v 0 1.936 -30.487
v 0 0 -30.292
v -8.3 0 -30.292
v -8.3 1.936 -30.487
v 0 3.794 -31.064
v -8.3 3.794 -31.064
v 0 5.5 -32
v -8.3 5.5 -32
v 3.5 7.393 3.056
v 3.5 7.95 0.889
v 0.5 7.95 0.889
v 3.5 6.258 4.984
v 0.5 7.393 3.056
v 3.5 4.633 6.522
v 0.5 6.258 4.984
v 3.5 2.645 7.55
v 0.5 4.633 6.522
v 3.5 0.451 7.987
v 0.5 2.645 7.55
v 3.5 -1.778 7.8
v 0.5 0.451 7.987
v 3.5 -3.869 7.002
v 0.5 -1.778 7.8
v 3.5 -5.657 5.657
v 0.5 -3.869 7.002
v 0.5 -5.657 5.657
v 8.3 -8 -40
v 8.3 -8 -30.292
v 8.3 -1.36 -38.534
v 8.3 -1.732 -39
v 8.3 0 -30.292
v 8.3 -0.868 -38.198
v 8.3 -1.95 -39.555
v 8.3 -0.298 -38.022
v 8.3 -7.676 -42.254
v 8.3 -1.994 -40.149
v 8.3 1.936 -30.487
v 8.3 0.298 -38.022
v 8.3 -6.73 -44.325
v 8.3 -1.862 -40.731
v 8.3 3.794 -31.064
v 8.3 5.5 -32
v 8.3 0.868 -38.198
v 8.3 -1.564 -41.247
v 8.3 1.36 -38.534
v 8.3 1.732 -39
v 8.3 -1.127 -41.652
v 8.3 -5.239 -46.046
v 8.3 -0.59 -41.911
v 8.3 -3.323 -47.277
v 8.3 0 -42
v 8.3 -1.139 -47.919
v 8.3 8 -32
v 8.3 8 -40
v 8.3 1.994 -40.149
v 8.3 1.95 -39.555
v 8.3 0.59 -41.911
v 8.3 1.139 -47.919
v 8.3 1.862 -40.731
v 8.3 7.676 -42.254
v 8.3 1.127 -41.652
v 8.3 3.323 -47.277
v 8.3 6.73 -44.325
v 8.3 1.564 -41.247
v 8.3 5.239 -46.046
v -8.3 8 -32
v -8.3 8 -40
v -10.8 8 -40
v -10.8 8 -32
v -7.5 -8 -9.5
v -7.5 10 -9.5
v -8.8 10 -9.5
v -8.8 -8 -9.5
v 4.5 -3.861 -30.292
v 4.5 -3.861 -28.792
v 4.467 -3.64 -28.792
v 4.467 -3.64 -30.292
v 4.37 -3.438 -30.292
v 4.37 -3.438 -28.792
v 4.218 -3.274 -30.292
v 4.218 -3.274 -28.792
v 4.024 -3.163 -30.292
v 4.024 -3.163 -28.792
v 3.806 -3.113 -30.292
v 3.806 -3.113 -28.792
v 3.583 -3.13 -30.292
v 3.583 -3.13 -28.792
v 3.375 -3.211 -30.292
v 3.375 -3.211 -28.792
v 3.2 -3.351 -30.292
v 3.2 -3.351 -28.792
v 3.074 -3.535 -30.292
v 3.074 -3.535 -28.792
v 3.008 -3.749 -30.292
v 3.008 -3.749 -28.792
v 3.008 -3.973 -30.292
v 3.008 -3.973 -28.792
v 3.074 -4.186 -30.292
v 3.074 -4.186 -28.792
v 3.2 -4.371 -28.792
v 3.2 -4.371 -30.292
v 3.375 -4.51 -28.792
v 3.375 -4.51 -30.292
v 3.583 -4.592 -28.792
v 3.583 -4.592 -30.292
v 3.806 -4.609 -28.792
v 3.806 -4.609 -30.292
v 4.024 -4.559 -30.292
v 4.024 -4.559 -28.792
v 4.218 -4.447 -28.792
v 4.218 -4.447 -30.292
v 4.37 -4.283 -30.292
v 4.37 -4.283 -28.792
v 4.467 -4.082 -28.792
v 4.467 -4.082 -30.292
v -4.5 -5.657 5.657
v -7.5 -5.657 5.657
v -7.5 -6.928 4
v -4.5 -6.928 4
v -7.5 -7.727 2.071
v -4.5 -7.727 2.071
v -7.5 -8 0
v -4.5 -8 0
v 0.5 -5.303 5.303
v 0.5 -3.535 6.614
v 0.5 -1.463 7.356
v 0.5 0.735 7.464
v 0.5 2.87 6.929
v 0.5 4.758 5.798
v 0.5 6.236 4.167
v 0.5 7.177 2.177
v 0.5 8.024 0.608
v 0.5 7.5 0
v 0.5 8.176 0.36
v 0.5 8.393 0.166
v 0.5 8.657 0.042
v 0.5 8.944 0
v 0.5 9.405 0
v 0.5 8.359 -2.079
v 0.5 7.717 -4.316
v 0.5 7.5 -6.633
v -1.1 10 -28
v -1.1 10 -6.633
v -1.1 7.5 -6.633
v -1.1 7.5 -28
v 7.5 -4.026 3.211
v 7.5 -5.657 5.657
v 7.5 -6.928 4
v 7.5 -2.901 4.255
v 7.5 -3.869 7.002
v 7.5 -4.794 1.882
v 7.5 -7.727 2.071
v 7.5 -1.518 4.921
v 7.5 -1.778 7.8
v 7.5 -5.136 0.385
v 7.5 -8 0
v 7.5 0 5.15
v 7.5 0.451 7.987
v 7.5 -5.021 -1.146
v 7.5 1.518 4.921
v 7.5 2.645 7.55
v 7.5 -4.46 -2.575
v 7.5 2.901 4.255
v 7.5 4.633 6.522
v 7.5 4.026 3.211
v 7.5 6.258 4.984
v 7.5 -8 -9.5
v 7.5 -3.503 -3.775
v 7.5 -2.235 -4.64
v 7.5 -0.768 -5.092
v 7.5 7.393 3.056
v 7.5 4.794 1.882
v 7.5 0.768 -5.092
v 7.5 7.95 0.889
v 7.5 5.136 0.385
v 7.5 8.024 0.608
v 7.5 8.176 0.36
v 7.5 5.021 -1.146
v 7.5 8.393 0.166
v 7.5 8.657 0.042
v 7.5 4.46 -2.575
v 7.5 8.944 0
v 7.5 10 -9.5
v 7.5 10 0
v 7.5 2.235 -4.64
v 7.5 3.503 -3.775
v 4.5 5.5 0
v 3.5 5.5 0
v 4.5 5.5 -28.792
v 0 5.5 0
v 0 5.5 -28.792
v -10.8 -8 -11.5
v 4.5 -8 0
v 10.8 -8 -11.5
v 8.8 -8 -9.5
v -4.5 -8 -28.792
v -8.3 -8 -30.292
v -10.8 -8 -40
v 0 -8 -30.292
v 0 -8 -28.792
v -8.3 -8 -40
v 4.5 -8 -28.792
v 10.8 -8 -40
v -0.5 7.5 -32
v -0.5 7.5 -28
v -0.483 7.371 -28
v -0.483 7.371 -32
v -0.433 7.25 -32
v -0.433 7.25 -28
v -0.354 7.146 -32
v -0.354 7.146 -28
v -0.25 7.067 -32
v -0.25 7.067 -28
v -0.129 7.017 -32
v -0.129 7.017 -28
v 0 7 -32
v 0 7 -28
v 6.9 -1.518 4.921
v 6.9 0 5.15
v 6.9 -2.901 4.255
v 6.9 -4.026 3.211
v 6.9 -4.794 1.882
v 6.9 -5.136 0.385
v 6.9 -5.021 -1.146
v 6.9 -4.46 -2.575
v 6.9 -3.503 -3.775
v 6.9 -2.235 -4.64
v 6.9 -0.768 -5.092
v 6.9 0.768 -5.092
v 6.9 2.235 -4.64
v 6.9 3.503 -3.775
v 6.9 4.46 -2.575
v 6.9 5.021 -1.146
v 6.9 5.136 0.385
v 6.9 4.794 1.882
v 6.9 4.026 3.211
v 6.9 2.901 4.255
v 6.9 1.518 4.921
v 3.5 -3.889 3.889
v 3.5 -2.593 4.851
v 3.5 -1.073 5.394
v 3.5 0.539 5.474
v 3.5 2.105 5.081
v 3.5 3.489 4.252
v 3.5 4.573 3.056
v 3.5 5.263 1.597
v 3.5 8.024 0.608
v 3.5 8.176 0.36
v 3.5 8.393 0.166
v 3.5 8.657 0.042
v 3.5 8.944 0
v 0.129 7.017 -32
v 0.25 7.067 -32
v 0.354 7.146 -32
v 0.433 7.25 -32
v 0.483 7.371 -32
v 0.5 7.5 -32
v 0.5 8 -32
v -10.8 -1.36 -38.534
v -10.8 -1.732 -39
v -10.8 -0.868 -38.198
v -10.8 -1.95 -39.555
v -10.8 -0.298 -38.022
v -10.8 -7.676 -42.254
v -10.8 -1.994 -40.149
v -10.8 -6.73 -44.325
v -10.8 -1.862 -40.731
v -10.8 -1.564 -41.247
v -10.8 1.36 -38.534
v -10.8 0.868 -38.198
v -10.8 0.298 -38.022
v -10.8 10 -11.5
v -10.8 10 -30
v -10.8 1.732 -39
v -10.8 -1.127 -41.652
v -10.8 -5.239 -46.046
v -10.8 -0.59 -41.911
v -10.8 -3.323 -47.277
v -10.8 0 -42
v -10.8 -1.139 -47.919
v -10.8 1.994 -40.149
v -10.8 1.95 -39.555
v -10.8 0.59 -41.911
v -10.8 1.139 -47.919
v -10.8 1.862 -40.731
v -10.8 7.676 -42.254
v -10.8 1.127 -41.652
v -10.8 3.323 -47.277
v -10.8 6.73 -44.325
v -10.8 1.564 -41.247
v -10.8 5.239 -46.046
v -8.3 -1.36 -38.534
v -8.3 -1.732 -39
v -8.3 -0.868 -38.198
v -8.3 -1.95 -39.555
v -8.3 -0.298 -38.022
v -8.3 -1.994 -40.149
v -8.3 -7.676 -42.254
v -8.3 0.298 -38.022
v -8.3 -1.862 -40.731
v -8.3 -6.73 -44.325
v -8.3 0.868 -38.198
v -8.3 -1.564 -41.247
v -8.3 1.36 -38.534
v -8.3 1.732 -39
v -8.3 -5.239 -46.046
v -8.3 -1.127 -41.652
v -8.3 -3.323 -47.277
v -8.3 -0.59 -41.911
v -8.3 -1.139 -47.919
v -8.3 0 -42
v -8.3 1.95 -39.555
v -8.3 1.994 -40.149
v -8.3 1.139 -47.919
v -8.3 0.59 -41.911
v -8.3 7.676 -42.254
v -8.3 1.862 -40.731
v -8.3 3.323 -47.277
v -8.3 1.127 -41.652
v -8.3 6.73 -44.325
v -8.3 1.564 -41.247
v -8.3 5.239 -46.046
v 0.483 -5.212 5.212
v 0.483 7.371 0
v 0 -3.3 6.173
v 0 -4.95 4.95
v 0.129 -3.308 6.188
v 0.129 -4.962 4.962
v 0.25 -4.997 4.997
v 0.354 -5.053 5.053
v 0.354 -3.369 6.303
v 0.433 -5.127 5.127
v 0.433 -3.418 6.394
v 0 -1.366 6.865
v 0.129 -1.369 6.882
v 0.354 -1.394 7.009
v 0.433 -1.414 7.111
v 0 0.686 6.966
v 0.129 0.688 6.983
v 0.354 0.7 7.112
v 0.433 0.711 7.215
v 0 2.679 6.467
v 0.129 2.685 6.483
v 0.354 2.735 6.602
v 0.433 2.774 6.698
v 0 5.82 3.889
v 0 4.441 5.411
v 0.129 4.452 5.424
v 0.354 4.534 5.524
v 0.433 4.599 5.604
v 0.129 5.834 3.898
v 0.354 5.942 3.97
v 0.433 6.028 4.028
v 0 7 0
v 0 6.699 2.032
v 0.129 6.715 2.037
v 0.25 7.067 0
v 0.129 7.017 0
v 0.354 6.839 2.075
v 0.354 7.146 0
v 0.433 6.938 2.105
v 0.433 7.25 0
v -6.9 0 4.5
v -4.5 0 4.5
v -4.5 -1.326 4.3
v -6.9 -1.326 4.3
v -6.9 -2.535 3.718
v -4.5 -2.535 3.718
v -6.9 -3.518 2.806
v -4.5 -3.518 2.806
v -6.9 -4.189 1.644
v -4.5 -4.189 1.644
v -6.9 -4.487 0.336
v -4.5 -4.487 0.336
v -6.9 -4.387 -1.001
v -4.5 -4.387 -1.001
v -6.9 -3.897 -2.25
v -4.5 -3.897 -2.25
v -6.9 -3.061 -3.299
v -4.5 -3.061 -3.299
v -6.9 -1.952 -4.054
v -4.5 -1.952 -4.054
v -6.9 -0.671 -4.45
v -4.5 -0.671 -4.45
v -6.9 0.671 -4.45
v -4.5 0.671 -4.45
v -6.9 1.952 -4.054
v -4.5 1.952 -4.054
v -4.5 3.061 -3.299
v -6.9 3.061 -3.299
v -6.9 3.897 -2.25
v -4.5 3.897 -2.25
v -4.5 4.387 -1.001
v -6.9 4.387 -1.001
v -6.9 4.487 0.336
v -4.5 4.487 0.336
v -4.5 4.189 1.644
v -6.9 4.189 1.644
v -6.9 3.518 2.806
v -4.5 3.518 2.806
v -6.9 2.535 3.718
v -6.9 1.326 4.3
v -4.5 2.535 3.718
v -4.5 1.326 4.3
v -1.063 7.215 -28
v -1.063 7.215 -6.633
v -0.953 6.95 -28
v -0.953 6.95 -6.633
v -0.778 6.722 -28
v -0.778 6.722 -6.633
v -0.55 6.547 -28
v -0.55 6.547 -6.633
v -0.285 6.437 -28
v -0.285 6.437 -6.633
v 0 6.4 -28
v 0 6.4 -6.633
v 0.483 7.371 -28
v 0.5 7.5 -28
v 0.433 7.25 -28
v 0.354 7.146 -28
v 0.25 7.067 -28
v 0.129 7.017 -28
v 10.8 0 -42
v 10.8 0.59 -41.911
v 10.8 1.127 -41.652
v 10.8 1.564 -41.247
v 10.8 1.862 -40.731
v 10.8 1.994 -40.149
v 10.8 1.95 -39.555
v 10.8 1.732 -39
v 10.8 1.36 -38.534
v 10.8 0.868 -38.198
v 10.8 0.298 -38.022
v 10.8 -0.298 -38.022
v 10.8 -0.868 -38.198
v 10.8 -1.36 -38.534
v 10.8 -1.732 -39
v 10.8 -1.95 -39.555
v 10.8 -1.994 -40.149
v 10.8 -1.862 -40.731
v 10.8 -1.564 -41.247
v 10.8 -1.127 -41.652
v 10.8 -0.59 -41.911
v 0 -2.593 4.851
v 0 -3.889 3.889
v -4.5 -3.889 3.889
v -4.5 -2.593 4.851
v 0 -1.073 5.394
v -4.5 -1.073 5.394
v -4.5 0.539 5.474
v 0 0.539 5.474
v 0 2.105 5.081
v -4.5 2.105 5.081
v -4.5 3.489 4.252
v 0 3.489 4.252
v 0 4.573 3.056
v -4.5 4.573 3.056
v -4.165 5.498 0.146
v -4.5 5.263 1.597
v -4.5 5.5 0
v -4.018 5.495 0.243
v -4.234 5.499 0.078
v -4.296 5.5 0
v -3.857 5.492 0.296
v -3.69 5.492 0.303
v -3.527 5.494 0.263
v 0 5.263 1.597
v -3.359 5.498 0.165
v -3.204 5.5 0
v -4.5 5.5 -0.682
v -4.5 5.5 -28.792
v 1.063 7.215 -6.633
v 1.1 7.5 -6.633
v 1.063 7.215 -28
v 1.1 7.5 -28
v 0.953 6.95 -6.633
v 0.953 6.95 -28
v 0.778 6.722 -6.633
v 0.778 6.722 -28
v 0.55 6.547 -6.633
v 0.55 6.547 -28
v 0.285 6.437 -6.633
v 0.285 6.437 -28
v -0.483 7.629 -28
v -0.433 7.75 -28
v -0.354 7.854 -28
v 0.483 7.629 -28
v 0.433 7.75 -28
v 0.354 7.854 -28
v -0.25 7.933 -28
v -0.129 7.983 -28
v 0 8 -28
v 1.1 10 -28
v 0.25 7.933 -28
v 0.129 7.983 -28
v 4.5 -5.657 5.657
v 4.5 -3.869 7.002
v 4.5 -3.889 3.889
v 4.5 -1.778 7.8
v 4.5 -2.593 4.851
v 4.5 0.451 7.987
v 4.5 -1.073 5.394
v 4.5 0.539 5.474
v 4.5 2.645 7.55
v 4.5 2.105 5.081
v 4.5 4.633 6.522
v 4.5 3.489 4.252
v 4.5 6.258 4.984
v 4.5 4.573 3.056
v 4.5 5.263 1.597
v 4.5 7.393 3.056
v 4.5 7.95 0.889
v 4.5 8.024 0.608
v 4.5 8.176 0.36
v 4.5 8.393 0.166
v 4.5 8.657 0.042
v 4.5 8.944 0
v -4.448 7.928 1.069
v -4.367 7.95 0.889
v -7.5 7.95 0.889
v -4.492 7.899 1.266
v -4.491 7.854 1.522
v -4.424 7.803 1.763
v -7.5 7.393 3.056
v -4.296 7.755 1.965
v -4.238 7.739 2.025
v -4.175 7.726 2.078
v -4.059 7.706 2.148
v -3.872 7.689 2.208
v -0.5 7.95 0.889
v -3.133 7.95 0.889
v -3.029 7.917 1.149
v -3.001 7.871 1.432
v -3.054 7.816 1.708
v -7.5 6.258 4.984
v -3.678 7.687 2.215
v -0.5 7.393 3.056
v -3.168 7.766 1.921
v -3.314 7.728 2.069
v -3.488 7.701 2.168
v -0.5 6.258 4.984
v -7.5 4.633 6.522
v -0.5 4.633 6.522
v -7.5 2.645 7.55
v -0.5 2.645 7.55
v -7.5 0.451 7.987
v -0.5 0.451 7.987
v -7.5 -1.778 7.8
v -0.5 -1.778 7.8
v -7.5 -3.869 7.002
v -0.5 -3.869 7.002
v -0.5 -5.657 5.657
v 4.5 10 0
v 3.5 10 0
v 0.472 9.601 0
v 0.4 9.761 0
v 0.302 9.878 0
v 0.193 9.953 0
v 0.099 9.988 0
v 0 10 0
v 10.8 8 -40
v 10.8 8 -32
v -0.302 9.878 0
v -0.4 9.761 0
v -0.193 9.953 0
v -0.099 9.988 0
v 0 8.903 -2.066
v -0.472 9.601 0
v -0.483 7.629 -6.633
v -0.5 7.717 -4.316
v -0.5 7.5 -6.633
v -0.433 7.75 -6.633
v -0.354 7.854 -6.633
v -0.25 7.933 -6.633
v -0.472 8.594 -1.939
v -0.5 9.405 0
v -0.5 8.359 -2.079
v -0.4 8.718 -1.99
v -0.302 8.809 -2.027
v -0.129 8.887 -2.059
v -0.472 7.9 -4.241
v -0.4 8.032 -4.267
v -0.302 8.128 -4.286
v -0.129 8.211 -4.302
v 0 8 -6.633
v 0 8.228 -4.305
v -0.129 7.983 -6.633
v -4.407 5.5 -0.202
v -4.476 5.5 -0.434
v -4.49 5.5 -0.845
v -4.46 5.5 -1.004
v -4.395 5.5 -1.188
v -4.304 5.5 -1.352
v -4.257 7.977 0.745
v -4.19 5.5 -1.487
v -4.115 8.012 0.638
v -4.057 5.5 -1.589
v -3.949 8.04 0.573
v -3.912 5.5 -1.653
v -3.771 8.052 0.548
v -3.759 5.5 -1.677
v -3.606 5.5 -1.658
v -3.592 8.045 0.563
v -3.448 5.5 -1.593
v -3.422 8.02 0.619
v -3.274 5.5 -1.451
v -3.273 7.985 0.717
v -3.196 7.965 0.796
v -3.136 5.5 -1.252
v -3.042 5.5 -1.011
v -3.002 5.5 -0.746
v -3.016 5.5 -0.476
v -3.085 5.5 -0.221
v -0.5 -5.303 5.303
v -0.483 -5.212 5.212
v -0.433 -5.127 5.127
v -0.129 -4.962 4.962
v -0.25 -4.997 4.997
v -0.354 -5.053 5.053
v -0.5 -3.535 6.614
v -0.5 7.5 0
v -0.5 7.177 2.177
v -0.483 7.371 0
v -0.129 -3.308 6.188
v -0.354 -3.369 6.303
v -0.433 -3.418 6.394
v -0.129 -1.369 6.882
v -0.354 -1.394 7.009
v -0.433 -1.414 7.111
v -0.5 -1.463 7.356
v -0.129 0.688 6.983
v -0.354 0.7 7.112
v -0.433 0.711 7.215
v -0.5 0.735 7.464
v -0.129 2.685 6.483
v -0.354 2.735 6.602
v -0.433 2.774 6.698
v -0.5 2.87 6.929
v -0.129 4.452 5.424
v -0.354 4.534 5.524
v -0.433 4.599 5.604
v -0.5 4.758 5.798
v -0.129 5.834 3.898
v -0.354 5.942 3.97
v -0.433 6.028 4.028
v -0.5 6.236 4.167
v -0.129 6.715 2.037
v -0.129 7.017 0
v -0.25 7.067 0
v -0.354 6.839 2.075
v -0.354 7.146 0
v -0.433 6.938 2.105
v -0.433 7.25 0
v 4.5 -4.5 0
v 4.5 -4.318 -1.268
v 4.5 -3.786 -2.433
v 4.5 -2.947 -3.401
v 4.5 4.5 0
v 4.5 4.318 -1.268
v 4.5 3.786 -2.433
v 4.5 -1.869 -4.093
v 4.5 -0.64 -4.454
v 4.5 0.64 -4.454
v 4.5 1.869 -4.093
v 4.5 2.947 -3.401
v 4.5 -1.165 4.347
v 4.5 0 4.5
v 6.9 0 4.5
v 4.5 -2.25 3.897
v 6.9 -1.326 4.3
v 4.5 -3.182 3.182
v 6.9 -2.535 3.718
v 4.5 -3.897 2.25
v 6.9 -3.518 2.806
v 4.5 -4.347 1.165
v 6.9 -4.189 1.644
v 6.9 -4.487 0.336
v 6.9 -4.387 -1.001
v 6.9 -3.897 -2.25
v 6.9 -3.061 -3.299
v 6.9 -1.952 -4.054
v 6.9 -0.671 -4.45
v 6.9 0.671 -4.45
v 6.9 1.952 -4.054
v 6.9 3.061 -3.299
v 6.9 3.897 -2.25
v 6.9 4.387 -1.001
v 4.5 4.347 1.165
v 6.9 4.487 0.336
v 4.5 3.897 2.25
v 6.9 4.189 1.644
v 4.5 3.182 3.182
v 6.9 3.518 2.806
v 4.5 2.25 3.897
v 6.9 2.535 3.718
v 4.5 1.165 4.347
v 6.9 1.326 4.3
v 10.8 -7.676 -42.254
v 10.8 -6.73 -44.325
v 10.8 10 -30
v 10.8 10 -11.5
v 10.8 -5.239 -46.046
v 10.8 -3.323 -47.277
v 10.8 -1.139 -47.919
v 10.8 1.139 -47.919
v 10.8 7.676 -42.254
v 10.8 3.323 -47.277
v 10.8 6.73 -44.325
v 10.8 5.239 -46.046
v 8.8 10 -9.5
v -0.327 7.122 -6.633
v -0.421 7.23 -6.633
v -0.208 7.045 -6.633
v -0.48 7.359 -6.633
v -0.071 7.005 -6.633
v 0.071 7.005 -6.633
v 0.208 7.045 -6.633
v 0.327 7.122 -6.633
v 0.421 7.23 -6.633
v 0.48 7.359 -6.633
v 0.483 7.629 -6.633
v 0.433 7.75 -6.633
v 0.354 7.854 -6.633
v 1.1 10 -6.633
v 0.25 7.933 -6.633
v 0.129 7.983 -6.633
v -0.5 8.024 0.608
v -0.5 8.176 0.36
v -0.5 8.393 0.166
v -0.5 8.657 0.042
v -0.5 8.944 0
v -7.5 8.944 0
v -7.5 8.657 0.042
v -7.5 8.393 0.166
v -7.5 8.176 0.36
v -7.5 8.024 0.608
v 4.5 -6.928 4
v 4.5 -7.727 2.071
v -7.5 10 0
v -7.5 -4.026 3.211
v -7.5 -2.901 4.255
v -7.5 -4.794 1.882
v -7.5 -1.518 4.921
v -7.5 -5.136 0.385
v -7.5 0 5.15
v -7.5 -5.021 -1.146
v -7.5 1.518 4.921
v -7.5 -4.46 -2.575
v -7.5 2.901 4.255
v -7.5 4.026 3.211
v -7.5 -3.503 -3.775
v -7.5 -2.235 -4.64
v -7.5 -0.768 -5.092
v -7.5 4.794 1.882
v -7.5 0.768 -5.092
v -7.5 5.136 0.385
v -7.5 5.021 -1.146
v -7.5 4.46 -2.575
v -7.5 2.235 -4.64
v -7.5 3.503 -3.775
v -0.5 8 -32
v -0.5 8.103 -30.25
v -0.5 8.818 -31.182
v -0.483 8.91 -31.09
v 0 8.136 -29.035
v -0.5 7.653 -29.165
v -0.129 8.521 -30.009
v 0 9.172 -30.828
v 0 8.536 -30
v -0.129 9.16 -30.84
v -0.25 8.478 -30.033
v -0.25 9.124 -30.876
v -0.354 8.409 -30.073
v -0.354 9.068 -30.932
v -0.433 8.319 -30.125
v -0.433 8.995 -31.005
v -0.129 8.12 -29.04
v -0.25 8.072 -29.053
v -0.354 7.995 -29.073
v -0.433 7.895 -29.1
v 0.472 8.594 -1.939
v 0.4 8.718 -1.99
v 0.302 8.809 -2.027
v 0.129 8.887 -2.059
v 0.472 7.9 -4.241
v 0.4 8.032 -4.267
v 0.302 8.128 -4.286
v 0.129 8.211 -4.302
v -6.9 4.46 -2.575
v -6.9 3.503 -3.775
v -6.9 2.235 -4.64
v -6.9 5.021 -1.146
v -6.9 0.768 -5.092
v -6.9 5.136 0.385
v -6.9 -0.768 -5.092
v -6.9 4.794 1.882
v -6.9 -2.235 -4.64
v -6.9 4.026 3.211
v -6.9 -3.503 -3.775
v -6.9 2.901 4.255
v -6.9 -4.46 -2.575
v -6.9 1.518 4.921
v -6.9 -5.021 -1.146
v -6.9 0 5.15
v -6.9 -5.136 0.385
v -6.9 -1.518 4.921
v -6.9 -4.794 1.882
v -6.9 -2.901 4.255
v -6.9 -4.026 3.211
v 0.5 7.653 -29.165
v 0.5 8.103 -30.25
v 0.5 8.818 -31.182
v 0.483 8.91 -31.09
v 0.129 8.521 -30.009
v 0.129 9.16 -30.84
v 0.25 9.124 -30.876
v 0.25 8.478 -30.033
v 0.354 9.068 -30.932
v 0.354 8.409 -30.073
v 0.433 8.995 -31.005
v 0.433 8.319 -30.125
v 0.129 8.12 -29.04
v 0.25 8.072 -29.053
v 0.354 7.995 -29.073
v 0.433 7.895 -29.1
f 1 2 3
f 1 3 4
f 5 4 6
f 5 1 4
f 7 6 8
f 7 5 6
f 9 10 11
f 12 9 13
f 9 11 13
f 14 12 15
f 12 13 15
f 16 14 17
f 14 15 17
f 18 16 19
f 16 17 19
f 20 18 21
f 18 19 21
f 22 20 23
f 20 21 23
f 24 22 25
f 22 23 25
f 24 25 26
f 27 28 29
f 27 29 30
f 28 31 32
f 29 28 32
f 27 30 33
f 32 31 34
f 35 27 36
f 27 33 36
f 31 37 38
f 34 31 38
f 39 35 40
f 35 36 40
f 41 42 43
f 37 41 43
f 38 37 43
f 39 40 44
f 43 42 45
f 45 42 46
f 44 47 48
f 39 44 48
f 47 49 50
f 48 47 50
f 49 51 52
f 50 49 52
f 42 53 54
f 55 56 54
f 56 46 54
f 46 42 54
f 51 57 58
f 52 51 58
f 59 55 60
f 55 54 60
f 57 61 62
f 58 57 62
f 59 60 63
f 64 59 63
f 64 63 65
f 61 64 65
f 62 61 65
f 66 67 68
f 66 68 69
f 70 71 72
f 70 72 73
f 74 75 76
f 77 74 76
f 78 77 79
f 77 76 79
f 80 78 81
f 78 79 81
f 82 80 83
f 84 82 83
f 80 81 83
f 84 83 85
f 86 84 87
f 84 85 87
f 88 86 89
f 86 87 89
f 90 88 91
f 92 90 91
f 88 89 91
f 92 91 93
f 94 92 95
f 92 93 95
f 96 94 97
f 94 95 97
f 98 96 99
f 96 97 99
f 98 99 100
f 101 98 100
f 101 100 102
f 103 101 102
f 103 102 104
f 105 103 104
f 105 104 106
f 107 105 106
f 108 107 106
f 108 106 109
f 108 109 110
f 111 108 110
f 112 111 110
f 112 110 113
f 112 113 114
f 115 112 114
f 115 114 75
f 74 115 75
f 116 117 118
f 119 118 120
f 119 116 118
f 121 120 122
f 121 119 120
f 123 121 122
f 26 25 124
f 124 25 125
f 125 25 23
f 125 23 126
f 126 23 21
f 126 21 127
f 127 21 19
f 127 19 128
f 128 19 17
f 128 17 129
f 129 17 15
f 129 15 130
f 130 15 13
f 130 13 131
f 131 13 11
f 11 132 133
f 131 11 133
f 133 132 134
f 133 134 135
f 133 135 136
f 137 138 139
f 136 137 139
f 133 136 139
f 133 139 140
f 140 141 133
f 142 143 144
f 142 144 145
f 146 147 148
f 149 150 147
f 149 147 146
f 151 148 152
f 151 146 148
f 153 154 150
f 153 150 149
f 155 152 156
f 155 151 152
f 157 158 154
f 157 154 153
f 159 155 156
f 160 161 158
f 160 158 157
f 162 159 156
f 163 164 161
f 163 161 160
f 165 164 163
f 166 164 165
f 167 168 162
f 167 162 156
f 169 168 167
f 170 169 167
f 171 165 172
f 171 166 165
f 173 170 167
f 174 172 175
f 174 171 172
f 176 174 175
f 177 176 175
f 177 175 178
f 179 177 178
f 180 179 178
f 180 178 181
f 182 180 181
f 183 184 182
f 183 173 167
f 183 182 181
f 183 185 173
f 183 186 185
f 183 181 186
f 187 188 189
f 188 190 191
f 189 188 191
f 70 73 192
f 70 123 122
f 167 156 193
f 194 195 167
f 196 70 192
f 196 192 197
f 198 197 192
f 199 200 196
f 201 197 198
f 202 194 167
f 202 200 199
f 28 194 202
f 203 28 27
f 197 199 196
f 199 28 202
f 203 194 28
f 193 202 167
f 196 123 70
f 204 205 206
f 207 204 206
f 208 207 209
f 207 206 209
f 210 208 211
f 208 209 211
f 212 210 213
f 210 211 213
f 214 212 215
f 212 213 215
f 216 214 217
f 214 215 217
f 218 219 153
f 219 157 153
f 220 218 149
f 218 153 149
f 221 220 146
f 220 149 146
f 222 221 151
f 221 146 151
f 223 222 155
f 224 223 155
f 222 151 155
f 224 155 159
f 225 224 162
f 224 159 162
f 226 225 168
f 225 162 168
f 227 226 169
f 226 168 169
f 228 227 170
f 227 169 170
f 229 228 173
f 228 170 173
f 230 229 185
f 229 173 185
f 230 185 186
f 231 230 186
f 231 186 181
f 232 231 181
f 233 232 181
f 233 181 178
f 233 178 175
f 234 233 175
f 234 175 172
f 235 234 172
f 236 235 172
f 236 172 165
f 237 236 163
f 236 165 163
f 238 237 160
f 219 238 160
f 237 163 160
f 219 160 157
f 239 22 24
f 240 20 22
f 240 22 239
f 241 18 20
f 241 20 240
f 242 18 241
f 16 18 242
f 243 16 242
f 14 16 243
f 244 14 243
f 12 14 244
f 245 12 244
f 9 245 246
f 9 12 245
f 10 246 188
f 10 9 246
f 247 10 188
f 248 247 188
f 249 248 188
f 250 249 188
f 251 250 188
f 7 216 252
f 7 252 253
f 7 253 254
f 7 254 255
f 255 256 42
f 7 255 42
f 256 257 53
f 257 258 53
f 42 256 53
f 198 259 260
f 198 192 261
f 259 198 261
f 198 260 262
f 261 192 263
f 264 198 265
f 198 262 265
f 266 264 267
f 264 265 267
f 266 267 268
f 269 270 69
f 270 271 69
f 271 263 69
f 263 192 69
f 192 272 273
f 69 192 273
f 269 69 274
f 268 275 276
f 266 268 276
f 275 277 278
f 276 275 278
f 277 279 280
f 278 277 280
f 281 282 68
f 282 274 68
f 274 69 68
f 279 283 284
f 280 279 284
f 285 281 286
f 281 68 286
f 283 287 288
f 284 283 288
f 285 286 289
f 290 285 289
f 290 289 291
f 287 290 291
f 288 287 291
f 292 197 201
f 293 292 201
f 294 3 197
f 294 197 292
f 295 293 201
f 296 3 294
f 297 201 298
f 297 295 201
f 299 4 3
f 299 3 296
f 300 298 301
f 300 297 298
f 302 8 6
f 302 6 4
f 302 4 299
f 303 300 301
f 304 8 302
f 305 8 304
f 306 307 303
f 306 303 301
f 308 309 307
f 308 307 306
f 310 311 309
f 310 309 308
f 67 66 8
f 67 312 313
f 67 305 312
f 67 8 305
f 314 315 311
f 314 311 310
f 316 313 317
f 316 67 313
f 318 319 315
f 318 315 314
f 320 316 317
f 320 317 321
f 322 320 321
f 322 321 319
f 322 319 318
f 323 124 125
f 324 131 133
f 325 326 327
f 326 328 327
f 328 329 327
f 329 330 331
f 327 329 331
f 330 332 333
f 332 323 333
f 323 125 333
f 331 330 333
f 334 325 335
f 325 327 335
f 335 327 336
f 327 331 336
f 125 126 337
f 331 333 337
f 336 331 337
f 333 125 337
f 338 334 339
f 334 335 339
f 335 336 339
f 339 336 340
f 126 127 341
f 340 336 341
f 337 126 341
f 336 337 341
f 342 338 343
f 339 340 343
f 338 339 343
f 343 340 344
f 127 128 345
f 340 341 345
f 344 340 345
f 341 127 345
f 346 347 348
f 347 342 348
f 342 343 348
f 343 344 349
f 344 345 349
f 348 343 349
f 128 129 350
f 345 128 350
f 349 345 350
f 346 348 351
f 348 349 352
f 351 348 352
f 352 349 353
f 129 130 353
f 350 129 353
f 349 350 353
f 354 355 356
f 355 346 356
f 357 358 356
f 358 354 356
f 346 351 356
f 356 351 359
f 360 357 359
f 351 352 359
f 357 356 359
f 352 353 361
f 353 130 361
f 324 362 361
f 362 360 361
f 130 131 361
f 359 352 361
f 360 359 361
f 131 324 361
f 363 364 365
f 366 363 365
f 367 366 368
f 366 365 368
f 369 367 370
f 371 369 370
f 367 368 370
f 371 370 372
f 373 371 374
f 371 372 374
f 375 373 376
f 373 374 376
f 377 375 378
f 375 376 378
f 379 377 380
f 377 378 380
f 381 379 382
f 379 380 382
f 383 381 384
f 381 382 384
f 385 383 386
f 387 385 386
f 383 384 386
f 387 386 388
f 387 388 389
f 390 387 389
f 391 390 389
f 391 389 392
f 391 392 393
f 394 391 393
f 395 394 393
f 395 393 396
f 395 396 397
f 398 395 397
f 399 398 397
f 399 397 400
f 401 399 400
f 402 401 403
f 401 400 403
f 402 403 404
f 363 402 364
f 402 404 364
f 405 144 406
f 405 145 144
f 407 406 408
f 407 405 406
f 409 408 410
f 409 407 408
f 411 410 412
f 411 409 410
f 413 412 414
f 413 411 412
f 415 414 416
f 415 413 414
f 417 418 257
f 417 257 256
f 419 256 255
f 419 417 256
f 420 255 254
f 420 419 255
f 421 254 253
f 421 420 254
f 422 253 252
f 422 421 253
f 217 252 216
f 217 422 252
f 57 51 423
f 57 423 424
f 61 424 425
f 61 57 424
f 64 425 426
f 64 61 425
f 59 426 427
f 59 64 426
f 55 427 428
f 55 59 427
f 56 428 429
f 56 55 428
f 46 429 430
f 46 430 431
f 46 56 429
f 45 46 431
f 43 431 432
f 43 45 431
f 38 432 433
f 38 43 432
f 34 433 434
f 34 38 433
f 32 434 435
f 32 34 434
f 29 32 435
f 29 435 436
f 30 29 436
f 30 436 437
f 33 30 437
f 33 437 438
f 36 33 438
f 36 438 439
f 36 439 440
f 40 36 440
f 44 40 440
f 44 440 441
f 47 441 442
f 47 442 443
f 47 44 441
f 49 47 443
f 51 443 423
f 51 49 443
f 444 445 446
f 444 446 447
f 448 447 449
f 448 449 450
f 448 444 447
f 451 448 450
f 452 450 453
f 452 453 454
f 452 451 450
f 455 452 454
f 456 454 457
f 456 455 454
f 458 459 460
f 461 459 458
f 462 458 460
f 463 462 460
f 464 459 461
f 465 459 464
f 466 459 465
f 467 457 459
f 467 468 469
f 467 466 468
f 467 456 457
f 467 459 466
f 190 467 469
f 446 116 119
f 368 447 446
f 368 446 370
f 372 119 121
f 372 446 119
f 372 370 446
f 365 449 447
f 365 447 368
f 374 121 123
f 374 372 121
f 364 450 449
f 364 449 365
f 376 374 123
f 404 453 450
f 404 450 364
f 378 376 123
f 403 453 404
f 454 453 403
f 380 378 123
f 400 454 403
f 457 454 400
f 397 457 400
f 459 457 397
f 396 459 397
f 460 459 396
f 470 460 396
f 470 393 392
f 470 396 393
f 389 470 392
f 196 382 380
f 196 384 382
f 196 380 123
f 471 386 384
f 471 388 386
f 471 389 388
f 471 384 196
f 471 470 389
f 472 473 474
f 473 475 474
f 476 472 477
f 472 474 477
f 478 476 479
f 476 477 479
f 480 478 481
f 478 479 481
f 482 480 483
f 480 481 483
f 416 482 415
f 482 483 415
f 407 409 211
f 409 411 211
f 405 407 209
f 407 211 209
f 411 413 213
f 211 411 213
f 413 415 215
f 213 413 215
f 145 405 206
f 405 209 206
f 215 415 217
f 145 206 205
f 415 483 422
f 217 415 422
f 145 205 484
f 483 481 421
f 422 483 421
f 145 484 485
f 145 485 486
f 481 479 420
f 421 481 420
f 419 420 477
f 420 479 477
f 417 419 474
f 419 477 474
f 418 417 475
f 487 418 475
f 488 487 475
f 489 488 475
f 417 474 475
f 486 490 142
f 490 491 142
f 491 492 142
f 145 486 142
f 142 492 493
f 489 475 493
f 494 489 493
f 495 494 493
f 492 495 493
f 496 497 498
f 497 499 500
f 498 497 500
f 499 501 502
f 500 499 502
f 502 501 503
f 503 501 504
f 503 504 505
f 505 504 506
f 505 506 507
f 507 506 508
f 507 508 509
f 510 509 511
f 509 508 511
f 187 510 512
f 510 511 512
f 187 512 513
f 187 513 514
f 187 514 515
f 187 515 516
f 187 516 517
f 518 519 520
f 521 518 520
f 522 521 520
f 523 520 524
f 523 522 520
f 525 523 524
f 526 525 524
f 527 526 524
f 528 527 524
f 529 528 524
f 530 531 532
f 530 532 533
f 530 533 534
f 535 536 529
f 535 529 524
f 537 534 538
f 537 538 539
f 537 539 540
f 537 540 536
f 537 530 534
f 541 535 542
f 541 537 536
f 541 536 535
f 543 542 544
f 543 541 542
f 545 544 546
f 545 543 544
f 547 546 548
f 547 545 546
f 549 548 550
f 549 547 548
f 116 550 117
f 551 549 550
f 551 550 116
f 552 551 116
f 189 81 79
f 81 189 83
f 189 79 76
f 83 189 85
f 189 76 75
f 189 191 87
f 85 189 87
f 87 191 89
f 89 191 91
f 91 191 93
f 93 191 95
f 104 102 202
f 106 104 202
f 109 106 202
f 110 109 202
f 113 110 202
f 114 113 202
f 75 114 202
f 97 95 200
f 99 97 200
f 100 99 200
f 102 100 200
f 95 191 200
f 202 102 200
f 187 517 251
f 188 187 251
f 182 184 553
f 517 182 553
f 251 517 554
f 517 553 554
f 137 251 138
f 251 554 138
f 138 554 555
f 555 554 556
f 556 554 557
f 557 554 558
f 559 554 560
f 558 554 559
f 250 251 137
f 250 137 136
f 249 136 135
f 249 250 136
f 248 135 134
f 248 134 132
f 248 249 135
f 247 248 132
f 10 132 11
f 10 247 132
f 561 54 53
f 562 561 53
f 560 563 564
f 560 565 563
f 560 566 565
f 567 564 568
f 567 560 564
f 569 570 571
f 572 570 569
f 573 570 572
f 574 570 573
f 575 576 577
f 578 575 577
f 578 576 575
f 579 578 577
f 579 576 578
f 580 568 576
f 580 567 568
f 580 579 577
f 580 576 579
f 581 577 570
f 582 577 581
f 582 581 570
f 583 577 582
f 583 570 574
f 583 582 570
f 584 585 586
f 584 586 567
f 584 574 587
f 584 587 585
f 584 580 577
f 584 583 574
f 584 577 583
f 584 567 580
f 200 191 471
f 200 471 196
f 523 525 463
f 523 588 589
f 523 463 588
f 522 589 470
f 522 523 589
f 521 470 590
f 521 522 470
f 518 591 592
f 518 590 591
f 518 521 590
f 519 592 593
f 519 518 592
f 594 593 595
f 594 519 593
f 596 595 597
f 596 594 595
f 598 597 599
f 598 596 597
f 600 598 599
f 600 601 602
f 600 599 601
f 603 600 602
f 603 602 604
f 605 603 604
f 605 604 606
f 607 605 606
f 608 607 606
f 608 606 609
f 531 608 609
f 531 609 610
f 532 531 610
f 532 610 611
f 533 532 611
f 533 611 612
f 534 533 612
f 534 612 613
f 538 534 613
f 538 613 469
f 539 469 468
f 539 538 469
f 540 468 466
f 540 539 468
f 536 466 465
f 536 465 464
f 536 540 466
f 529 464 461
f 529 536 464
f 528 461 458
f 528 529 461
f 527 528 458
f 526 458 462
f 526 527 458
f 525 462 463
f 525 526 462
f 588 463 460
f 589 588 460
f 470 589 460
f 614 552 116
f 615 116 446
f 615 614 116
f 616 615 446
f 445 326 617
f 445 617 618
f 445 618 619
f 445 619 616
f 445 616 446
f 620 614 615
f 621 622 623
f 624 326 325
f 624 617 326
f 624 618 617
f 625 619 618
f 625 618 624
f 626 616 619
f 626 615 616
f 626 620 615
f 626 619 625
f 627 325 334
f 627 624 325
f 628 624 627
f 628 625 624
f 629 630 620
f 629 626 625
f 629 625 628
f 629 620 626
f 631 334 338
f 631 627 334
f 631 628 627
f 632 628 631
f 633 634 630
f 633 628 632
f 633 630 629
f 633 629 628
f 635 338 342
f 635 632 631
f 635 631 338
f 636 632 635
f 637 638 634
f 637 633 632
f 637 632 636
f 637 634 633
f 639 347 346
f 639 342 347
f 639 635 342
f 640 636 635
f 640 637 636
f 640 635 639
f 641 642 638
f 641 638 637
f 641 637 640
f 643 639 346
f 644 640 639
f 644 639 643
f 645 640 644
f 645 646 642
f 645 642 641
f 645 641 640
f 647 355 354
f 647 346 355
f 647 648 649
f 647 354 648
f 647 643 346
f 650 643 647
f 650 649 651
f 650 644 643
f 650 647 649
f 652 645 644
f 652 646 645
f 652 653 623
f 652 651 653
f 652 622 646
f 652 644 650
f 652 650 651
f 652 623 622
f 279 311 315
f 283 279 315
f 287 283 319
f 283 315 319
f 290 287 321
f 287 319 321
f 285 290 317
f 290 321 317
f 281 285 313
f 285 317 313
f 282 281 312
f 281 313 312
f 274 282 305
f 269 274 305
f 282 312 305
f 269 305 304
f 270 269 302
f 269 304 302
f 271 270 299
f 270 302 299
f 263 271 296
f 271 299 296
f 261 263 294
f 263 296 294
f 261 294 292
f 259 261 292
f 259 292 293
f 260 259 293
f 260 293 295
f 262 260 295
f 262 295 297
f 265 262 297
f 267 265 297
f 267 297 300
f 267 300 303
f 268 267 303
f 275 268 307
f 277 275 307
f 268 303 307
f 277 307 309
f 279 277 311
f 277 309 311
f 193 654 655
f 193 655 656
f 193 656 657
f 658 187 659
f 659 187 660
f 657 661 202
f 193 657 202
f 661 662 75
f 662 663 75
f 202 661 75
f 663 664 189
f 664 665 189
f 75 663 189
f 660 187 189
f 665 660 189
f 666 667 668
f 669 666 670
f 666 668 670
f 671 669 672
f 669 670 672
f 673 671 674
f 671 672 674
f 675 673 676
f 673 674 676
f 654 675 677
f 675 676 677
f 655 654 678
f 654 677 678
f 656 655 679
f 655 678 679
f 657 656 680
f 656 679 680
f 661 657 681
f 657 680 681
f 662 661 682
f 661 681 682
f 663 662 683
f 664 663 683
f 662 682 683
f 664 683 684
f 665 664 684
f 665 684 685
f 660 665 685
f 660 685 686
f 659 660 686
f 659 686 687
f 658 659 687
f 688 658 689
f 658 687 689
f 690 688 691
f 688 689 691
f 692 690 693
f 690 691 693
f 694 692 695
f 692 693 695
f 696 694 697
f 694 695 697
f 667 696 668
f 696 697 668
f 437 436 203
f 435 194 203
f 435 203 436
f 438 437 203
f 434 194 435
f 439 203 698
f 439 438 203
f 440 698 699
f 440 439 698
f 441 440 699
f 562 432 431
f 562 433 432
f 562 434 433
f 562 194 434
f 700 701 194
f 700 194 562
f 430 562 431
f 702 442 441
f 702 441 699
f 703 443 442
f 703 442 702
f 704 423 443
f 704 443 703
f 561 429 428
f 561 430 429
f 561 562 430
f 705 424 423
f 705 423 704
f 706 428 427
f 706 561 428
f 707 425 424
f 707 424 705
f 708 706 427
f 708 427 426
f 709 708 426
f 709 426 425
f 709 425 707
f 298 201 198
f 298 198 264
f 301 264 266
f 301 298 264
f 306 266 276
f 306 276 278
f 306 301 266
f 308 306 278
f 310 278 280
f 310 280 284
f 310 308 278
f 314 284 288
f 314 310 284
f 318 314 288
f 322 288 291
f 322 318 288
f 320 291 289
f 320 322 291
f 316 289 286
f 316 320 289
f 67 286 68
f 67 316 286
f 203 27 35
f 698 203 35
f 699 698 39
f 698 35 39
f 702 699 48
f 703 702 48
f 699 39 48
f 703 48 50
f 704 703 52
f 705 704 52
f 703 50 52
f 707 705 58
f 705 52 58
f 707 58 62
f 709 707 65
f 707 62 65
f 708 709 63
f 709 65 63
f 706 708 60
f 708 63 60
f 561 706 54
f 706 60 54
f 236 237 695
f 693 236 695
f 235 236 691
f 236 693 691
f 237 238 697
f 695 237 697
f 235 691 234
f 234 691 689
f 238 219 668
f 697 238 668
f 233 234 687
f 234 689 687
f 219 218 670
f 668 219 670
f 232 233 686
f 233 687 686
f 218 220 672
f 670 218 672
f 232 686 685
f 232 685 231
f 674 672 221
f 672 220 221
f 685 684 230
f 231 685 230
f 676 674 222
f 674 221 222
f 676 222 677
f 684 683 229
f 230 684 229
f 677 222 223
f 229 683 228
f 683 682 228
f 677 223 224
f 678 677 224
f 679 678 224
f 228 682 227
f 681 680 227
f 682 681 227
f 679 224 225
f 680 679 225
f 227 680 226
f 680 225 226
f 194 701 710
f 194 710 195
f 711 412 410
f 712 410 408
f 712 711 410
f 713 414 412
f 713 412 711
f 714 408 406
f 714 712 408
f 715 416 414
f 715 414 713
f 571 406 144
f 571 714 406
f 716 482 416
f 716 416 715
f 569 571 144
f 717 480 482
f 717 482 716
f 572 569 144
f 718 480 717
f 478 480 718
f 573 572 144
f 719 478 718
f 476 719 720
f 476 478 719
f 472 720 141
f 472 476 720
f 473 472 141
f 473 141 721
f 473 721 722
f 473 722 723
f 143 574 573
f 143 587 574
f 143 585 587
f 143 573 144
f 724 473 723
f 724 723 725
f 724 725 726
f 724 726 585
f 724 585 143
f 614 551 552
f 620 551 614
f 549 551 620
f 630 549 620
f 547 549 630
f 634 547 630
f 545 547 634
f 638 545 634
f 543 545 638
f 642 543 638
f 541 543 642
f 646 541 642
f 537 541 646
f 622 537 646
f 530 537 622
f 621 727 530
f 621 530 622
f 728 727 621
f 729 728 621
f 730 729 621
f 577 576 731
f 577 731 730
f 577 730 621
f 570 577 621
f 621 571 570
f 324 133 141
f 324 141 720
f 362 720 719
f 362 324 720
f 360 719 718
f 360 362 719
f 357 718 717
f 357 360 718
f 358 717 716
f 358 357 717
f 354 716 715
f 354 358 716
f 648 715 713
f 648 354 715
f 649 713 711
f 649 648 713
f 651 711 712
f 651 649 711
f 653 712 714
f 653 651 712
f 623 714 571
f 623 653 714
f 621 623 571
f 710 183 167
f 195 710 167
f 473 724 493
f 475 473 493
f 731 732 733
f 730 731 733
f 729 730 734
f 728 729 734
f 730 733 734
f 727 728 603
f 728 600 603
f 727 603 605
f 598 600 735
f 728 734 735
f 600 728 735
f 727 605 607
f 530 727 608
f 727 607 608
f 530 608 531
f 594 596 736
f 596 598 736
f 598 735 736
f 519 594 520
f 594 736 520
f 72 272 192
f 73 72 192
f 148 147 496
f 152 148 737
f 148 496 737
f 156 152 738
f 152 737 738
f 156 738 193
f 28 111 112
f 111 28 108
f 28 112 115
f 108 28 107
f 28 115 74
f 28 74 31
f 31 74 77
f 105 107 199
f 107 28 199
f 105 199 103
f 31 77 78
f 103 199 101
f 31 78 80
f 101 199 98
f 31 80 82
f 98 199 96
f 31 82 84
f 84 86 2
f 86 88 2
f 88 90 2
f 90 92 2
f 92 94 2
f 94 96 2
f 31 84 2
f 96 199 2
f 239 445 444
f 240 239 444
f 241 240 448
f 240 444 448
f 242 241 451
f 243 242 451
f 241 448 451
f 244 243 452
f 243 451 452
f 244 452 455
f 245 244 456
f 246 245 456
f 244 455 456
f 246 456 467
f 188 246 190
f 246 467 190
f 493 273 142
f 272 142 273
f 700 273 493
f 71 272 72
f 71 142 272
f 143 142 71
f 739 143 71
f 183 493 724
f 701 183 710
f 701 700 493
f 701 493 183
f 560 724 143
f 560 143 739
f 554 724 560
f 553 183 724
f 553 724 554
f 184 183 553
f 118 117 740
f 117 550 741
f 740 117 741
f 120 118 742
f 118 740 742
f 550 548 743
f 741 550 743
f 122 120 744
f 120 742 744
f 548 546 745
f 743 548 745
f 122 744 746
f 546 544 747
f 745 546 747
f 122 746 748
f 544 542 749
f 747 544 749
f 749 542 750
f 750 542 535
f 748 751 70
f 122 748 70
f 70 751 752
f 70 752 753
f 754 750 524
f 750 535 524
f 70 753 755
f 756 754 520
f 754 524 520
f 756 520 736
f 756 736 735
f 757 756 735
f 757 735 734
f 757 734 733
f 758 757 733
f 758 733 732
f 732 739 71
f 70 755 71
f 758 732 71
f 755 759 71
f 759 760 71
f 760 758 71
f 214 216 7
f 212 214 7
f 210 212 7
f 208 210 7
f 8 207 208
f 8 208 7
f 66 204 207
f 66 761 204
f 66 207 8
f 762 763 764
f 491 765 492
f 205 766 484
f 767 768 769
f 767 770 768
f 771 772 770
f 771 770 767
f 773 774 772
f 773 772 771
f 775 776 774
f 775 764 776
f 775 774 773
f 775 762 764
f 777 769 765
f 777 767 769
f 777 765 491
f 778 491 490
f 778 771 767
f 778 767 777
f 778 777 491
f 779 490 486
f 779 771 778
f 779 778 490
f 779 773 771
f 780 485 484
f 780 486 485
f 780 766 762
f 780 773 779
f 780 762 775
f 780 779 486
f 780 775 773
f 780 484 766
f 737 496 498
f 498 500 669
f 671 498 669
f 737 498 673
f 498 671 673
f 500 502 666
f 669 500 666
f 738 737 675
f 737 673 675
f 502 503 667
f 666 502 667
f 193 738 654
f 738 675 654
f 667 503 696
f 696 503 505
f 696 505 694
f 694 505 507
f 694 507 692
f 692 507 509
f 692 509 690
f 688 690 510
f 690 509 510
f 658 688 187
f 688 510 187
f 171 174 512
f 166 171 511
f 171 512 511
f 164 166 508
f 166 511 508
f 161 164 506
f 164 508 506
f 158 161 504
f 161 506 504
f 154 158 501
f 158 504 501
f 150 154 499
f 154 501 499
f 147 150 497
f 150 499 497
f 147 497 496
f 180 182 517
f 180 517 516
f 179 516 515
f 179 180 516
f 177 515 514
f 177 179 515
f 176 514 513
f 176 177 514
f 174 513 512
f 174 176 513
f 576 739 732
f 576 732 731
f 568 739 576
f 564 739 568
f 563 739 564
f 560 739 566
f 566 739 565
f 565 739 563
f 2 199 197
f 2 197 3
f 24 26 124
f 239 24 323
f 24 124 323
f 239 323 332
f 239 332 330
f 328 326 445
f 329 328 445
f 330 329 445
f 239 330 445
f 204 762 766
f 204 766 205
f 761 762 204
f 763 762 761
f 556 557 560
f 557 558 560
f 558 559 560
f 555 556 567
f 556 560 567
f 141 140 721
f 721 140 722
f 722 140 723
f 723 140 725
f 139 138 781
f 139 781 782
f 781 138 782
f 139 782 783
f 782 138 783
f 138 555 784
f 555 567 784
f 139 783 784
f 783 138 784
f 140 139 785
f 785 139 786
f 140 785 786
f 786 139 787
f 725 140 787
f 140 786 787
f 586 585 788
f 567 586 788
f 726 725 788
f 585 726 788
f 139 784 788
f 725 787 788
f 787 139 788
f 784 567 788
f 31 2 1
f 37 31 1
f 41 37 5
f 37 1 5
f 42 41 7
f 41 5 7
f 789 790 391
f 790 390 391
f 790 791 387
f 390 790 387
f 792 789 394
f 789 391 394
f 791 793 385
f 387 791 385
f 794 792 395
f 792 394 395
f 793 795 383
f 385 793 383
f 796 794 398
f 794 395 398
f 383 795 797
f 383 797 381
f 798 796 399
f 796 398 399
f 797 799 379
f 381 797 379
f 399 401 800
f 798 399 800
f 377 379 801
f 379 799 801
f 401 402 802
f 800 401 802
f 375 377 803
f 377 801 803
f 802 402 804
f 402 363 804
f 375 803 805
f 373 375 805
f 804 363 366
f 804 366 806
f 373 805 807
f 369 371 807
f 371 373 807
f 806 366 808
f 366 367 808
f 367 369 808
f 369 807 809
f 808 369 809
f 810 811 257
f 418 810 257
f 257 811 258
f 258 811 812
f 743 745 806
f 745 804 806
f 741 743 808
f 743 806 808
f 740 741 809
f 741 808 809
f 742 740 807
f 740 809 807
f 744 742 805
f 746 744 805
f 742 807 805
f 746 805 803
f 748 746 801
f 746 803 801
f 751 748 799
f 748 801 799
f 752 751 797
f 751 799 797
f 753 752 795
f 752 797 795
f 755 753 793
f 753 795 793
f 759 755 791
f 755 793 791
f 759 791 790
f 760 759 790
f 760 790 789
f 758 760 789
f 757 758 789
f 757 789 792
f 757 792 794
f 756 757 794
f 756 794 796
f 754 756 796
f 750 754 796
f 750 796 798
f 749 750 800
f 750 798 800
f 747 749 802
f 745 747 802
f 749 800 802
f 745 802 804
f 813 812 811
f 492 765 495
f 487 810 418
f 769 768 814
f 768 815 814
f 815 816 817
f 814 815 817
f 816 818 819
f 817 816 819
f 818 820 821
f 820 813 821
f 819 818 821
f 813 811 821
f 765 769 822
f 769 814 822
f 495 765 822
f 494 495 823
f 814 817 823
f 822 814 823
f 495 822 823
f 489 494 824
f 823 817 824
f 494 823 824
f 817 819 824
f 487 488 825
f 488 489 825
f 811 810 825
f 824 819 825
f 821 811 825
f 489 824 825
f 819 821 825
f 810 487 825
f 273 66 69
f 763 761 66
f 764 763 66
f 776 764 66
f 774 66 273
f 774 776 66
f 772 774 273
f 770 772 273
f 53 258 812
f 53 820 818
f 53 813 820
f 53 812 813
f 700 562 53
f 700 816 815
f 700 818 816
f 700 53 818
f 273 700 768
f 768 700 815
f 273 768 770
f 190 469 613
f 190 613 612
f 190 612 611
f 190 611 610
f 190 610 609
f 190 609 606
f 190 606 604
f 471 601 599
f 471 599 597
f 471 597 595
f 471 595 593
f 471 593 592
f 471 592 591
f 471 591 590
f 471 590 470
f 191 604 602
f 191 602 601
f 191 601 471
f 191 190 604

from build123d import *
from build123d.topology import SkipClean

# Parameters (mm, degrees)
BOSS_EXTRU_1_START      = 4.5
ESQUISSE1_R             = 2
BOSS_EXTRU_1_DEPTH      = 3
BOSS_EXTRU_2_START      = 7.5
BOSS_EXTRU_2_DEPTH      = 3.3
BOSS_EXTRU_5_START      = 8.3
ESQUISSE1_12_R          = 2
BOSS_EXTRU_5_DEPTH      = 2.5
BOSS_EXTRU_3_DEPTH      = 7.5
BOSS_EXTRU_4_START      = 0.5
BOSS_EXTRU_4_DEPTH      = 7
CONG_4_R                = 12
FILLET1_R               = 0.5
FILLET2_R               = 1
CHAMFER1_SIZE           = 2
ENL_V_START             = 4.5
ESQUISSE2_W             = 8
ESQUISSE2_H             = 18
ENL_V_MAT_EXTRU_1_DEPTH = 1
ENL_V_MAT_EXTRU_3_REACH = 52.206
ESQUISSE4_R             = 0.75
ESQUISSE5_W             = 21.366750419
ESQUISSE5_H             = 3.6
ENL_V_MAT_EXTRU_4_DEPTH = 1.1
CONG_5_R                = 1.1
ENL_V_MAT_EXTRU_5_REACH = 59.505
ESQUISSE12_R            = 0.75


# Some blends are built 0.0001 mm under size
with BuildPart() as part:
    # Esquisse1 → Boss.-Extru.1 (new body)
    with BuildSketch(Plane(origin=(0, 0, 0), x_dir=(0, 0, -1), z_dir=(1, 0, 0)).offset(BOSS_EXTRU_1_START)):
        with BuildLine():
            Line((30, 10), (0, 10))
            Line((0, 10), (0, 8))
            ThreePointArc((0, 8), (-8, 0), (0, -8))
            Line((0, -8), (30.291756081, -8))
            Line((30.291756081, -8), (30.291756081, 0))
            ThreePointArc((30.291756081, 0), (30.728647581, 2.879587526), (32, 5.5))
            Line((32, 5.5), (32, 8))
            Line((32, 8), (30, 10))
        make_face()
        Circle(ESQUISSE1_R, mode=Mode.SUBTRACT)
    extrude(amount=BOSS_EXTRU_1_DEPTH)

    # Esquisse1<8> → Boss.-Extru.2 (add)
    with BuildSketch(Plane(origin=(0, 0, 0), x_dir=(0, 0, -1), z_dir=(1, 0, 0)).offset(BOSS_EXTRU_2_START)):
        with BuildLine():
            Line((30, 10), (9.5, 10))
            Line((9.5, 10), (9.5, -8))
            Line((9.5, -8), (30.291756081, -8))
            Line((30.291756081, -8), (30.291756081, 0))
            ThreePointArc((30.291756081, 0), (30.728647581, 2.879587526), (32, 5.5))
            Line((32, 5.5), (32, 8))
            Line((32, 8), (30, 10))
        make_face()
    extrude(amount=BOSS_EXTRU_2_DEPTH)

    # Esquisse1<12> → Boss.-Extru.5 (add)
    with BuildSketch(Plane(origin=(0, 0, 0), x_dir=(0, 0, -1), z_dir=(1, 0, 0)).offset(BOSS_EXTRU_5_START)):
        with BuildLine():
            Line((40, 8), (32, 8))
            Line((32, 8), (32, 7))
            Line((32, 7), (32, 5.5))
            ThreePointArc((32, 5.5), (30.728647581, 2.879587526), (30.291756081, 0))
            Line((30.291756081, 0), (30.291756081, -8))
            Line((30.291756081, -8), (40, -8))
            ThreePointArc((40, -8), (48, 0), (40, 8))
        make_face()
        with Locations((40, 0)):
            Circle(ESQUISSE1_12_R, mode=Mode.SUBTRACT)
    extrude(amount=BOSS_EXTRU_5_DEPTH)

    # Esquisse1<9> → Boss.-Extru.3 (add)
    with BuildSketch(Plane(origin=(0, 0, 0), x_dir=(0, 0, -1), z_dir=(1, 0, 0))):
        with BuildLine():
            Line((0, 10), (2, 8))
            Line((2, 8), (28, 8))
            ThreePointArc((28, 8), (29.530733729, 8.30448187), (30.828427125, 9.171572875))
            Line((30.828427125, 9.171572875), (30, 10))
            Line((30, 10), (0, 10))
        make_face()
        with BuildLine():
            Line((0, 5.5), (28.791756081, 5.5))
            Line((28.791756081, 5.5), (28.791756081, -8))
            Line((28.791756081, -8), (30.291756081, -8))
            Line((30.291756081, -8), (30.291756081, 0))
            ThreePointArc((30.291756081, 0), (30.728647581, 2.879587526), (32, 5.5))
            Line((32, 5.5), (32, 7))
            Line((32, 7), (0, 7))
            ThreePointArc((0, 7), (-6.467156728, 2.678784027), (-4.949747468, -4.949747468))
            Line((-4.949747468, -4.949747468), (-3.889087297, -3.889087297))
            ThreePointArc((-3.889087297, -3.889087297), (-5.081337429, 2.104758878), (0, 5.5))
        make_face()
    extrude(amount=BOSS_EXTRU_3_DEPTH)

    # Esquisse1<10> → Boss.-Extru.4 (add)
    with BuildSketch(Plane(origin=(0, 0, 0), x_dir=(0, 0, -1), z_dir=(1, 0, 0)).offset(BOSS_EXTRU_4_START)):
        with BuildLine():
            Line((2, 8), (0, 10))
            Line((0, 10), (0, 8))
            ThreePointArc((0, 8), (-7.39103626, 3.061467459), (-5.656854249, -5.656854249))
            Line((-5.656854249, -5.656854249), (-4.949747468, -4.949747468))
            ThreePointArc((-4.949747468, -4.949747468), (-6.467156728, 2.678784027), (0, 7))
            Line((0, 7), (32, 7))
            Line((32, 7), (32, 8))
            Line((32, 8), (30.828427125, 9.171572875))
            ThreePointArc((30.828427125, 9.171572875), (29.530733729, 8.30448187), (28, 8))
            Line((28, 8), (2, 8))
        make_face()
    extrude(amount=BOSS_EXTRU_4_DEPTH)

    # Congé4
    # the kernel refuses this fillet: 12 mm, written as the material it takes off along each edge
    with BuildSketch(Plane(origin=(-11.583123952, 8, -2), x_dir=(0, 0, -1), z_dir=(1, 0, 0))) as cong_4_piece_1:
        with BuildLine():
            CenterArc((4.633249581, 12), CONG_4_R, 236.442690238, 33.557309762)
            Line((-2, 2), (-2.132664992, 1.8))
            ThreePointArc((-2.132664992, 1.8), (-1.169705627, 0.830294373), (-0.169705627, -0.169705627))
            Line((-0.169705627, -0.169705627), (0, -0.24))
            Line((0, -0.24), (4.633249581, -0.24))
            Line((4.633249581, -0.24), (4.633249581, 0))
        make_face()
    extrude(amount=12.083123952, mode=Mode.SUBTRACT)

    # Fillet1
    # the kernel refuses this fillet: 0.5 mm, written as the material it adds along each edge
    with BuildSketch(Plane(origin=(0.5, 20, -6.633249581), x_dir=(0, -0.7713363788823462, 0.6364276790120538), z_dir=(0, 0.6364276790120538, 0.7713363788823462))) as fillet1_piece_1_section:
        with BuildLine():
            CenterArc((12 + FILLET1_R, -FILLET1_R), FILLET1_R, 90, 90)
            Line((12 + FILLET1_R, 0), (12, 0))
            Line((12, 0), (12, -FILLET1_R))
        make_face()
    fillet1_piece_1 = revolve(axis=Axis((0.5, 20, -6.633249581), (1, 0, 0)), revolution_arc=39.525953359, mode=Mode.PRIVATE)
    fillet1_piece_1 = split(fillet1_piece_1, bisect_by=Plane(origin=(0.358961784, 10, -3.12843374), z_dir=(0, -1, 0)), keep=Keep.TOP, mode=Mode.PRIVATE)
    fillet1_piece_1 = split(fillet1_piece_1, bisect_by=Plane(origin=(0.358961784, 8.375840896, 0), z_dir=(0, 0, -1)), keep=Keep.TOP, mode=Mode.PRIVATE)
    add(fillet1_piece_1)
    with BuildSketch(Plane(origin=(0.5, 8, -28), x_dir=(-1, 0, 0), z_dir=(0, 0, 1))) as fillet1_piece_2:
        with BuildLine():
            CenterArc((FILLET1_R, FILLET1_R), FILLET1_R, 180, 90)
            Line((0, FILLET1_R), (0, 0))
            Line((0, 0), (FILLET1_R, 0))
        make_face()
    extrude(amount=21.366750419)
    with BuildSketch(Plane(origin=(0.5, 7, 0), x_dir=(-1, 0, 0), z_dir=(0, 0, -1))) as fillet1_piece_3:
        with BuildLine():
            CenterArc((FILLET1_R, FILLET1_R), FILLET1_R, 180, 90)
            Line((0, FILLET1_R), (0, 0))
            Line((0, 0), (FILLET1_R, 0))
        make_face()
    extrude(amount=32)
    with BuildSketch(Plane(origin=(0.5, 0, 0), x_dir=(0, -0.7071067811865441, 0.7071067811865509), z_dir=(0, -0.7071067811865509, -0.7071067811865441))) as fillet1_piece_4:
        with BuildLine():
            CenterArc((7 + FILLET1_R, FILLET1_R), FILLET1_R, 180, 90)
            Line((7 + FILLET1_R, 0), (7, 0))
            Line((7, 0), (7, FILLET1_R))
        make_face()
    revolve(axis=Axis((0.5, 0, 0), (-1, 0, 0)), revolution_arc=135)
    with BuildSketch(Plane(origin=(0.5, 12, -28), x_dir=(0, -0.7071067811865426, -0.7071067811865523), z_dir=(0, 0.7071067811865523, -0.7071067811865426))) as fillet1_piece_5:
        with BuildLine():
            CenterArc((4 + FILLET1_R, FILLET1_R), FILLET1_R, 180, 90)
            Line((4 + FILLET1_R, 0), (4, 0))
            Line((4, 0), (4, FILLET1_R))
        make_face()
    revolve(axis=Axis((0.5, 12, -28), (-1, 0, 0)), revolution_arc=45)

    # Fillet2
    fillet2_edges = [part.edges().sort_by_distance(p)[0] for p in [
        (4, 8, 0),
    ]]
    fillet(fillet2_edges, radius=FILLET2_R)

    # Chamfer1
    chamfer1_edges = [part.edges().sort_by_distance(p)[0] for p in [
        (10.8, 1, -9.5),
    ]]
    chamfer(chamfer1_edges, length=CHAMFER1_SIZE)

    # Symétrie1: part across plane


with BuildPart() as part_1:
    add(part.part)
    add(part.part.mirror(Plane(origin=(0, 0, 0), x_dir=(0, 0, 1), z_dir=(1, 0, 0))))

    # Esquisse2 → Enlèv. mat.-Extru.1 (cut)
    with SkipClean():  # the faces are left unmerged after this step: merging them gives an invalid solid
        with BuildSketch(Plane(origin=(0, 0, 0), x_dir=(0, 0, -1), z_dir=(1, 0, 0)).offset(ENL_V_START)):
            with Locations((-4, 1)):
                Rectangle(ESQUISSE2_W, ESQUISSE2_H)
        extrude(amount=-ENL_V_MAT_EXTRU_1_DEPTH, mode=Mode.SUBTRACT)

    # Esquisse4 → Enlèv. mat.-Extru.3 (cut, up to next)
    with BuildSketch(Plane.XY, mode=Mode.PRIVATE) as enl_v_mat_extru_3_sk1:
        with Locations((3.75, -3.8608)):
            Circle(ESQUISSE4_R)
    enl_v_mat_extru_3_tool1 = extrude(enl_v_mat_extru_3_sk1.sketch, amount=-ENL_V_MAT_EXTRU_3_REACH, mode=Mode.PRIVATE) & part_1.part
    add(enl_v_mat_extru_3_tool1.solids().sort_by_distance((3.75, -3.8608, 0))[0], mode=Mode.SUBTRACT)

    # Esquisse5 → Enlèv. mat.-Extru.4 (cut, symmetric)
    with SkipClean():  # the faces are left unmerged after this step: merging them gives an invalid solid
        with BuildSketch(Plane(origin=(0, 0, 0), x_dir=(0, 0, -1), z_dir=(1, 0, 0))):
            with Locations((17.316624791, 8.2)):
                Rectangle(ESQUISSE5_W, ESQUISSE5_H)
        extrude(amount=ENL_V_MAT_EXTRU_4_DEPTH, both=True, mode=Mode.SUBTRACT)

    # Congé5
    cong_5_edges = [part_1.edges().sort_by_distance(p)[0] for p in [
        (1.1, 6.4, -17.31662479),
        (-1.1, 6.4, -17.31662479),
    ]]
    fillet(cong_5_edges, radius=CONG_5_R - 0.0001)  # a hair under: the kernel refuses the full size

    # Esquisse10 → Enlèvement de matière-Révolution1 (revolve, cut)
    with BuildSketch(Plane.XY, mode=Mode.PRIVATE) as enl_vement_de_mati_re_r_volution1_sk:
        Polygon((-7.5, 5.15), (-6.9, 5.15), (-6.9, 4.5), (6.9, 4.5), (6.9, 5.15), (7.5, 5.15), (7.5, 2), (-7.5, 2), align=None)
    revolve(enl_vement_de_mati_re_r_volution1_sk.sketch.rotate(Axis((-7.5, 0, 0), (1, 0, 0)), 90), axis=Axis((-7.5, 0, 0), (1, 0, 0)), mode=Mode.SUBTRACT)

    # Esquisse12 → Enlèv. mat.-Extru.5 (cut, up to next)
    with BuildSketch(Plane(origin=(0, 7.263410428, 6.380108848), x_dir=(1, 0, 0), z_dir=(0, -0.7538821952908842, -0.6570096160813761)), mode=Mode.PRIVATE) as enl_v_mat_extru_5_sk1:
        with Locations(Location((-3.75, -4.165219968, 0), (0, 0, 136.743720403))):
            Circle(ESQUISSE12_R)
    enl_v_mat_extru_5_tool1 = extrude(enl_v_mat_extru_5_sk1.sketch, amount=ENL_V_MAT_EXTRU_5_REACH, mode=Mode.PRIVATE) & part_1.part
    add(enl_v_mat_extru_5_tool1.solids().sort_by_distance((-3.75, 10, 3.240024))[0], mode=Mode.SUBTRACT)


solid = part_1.part
